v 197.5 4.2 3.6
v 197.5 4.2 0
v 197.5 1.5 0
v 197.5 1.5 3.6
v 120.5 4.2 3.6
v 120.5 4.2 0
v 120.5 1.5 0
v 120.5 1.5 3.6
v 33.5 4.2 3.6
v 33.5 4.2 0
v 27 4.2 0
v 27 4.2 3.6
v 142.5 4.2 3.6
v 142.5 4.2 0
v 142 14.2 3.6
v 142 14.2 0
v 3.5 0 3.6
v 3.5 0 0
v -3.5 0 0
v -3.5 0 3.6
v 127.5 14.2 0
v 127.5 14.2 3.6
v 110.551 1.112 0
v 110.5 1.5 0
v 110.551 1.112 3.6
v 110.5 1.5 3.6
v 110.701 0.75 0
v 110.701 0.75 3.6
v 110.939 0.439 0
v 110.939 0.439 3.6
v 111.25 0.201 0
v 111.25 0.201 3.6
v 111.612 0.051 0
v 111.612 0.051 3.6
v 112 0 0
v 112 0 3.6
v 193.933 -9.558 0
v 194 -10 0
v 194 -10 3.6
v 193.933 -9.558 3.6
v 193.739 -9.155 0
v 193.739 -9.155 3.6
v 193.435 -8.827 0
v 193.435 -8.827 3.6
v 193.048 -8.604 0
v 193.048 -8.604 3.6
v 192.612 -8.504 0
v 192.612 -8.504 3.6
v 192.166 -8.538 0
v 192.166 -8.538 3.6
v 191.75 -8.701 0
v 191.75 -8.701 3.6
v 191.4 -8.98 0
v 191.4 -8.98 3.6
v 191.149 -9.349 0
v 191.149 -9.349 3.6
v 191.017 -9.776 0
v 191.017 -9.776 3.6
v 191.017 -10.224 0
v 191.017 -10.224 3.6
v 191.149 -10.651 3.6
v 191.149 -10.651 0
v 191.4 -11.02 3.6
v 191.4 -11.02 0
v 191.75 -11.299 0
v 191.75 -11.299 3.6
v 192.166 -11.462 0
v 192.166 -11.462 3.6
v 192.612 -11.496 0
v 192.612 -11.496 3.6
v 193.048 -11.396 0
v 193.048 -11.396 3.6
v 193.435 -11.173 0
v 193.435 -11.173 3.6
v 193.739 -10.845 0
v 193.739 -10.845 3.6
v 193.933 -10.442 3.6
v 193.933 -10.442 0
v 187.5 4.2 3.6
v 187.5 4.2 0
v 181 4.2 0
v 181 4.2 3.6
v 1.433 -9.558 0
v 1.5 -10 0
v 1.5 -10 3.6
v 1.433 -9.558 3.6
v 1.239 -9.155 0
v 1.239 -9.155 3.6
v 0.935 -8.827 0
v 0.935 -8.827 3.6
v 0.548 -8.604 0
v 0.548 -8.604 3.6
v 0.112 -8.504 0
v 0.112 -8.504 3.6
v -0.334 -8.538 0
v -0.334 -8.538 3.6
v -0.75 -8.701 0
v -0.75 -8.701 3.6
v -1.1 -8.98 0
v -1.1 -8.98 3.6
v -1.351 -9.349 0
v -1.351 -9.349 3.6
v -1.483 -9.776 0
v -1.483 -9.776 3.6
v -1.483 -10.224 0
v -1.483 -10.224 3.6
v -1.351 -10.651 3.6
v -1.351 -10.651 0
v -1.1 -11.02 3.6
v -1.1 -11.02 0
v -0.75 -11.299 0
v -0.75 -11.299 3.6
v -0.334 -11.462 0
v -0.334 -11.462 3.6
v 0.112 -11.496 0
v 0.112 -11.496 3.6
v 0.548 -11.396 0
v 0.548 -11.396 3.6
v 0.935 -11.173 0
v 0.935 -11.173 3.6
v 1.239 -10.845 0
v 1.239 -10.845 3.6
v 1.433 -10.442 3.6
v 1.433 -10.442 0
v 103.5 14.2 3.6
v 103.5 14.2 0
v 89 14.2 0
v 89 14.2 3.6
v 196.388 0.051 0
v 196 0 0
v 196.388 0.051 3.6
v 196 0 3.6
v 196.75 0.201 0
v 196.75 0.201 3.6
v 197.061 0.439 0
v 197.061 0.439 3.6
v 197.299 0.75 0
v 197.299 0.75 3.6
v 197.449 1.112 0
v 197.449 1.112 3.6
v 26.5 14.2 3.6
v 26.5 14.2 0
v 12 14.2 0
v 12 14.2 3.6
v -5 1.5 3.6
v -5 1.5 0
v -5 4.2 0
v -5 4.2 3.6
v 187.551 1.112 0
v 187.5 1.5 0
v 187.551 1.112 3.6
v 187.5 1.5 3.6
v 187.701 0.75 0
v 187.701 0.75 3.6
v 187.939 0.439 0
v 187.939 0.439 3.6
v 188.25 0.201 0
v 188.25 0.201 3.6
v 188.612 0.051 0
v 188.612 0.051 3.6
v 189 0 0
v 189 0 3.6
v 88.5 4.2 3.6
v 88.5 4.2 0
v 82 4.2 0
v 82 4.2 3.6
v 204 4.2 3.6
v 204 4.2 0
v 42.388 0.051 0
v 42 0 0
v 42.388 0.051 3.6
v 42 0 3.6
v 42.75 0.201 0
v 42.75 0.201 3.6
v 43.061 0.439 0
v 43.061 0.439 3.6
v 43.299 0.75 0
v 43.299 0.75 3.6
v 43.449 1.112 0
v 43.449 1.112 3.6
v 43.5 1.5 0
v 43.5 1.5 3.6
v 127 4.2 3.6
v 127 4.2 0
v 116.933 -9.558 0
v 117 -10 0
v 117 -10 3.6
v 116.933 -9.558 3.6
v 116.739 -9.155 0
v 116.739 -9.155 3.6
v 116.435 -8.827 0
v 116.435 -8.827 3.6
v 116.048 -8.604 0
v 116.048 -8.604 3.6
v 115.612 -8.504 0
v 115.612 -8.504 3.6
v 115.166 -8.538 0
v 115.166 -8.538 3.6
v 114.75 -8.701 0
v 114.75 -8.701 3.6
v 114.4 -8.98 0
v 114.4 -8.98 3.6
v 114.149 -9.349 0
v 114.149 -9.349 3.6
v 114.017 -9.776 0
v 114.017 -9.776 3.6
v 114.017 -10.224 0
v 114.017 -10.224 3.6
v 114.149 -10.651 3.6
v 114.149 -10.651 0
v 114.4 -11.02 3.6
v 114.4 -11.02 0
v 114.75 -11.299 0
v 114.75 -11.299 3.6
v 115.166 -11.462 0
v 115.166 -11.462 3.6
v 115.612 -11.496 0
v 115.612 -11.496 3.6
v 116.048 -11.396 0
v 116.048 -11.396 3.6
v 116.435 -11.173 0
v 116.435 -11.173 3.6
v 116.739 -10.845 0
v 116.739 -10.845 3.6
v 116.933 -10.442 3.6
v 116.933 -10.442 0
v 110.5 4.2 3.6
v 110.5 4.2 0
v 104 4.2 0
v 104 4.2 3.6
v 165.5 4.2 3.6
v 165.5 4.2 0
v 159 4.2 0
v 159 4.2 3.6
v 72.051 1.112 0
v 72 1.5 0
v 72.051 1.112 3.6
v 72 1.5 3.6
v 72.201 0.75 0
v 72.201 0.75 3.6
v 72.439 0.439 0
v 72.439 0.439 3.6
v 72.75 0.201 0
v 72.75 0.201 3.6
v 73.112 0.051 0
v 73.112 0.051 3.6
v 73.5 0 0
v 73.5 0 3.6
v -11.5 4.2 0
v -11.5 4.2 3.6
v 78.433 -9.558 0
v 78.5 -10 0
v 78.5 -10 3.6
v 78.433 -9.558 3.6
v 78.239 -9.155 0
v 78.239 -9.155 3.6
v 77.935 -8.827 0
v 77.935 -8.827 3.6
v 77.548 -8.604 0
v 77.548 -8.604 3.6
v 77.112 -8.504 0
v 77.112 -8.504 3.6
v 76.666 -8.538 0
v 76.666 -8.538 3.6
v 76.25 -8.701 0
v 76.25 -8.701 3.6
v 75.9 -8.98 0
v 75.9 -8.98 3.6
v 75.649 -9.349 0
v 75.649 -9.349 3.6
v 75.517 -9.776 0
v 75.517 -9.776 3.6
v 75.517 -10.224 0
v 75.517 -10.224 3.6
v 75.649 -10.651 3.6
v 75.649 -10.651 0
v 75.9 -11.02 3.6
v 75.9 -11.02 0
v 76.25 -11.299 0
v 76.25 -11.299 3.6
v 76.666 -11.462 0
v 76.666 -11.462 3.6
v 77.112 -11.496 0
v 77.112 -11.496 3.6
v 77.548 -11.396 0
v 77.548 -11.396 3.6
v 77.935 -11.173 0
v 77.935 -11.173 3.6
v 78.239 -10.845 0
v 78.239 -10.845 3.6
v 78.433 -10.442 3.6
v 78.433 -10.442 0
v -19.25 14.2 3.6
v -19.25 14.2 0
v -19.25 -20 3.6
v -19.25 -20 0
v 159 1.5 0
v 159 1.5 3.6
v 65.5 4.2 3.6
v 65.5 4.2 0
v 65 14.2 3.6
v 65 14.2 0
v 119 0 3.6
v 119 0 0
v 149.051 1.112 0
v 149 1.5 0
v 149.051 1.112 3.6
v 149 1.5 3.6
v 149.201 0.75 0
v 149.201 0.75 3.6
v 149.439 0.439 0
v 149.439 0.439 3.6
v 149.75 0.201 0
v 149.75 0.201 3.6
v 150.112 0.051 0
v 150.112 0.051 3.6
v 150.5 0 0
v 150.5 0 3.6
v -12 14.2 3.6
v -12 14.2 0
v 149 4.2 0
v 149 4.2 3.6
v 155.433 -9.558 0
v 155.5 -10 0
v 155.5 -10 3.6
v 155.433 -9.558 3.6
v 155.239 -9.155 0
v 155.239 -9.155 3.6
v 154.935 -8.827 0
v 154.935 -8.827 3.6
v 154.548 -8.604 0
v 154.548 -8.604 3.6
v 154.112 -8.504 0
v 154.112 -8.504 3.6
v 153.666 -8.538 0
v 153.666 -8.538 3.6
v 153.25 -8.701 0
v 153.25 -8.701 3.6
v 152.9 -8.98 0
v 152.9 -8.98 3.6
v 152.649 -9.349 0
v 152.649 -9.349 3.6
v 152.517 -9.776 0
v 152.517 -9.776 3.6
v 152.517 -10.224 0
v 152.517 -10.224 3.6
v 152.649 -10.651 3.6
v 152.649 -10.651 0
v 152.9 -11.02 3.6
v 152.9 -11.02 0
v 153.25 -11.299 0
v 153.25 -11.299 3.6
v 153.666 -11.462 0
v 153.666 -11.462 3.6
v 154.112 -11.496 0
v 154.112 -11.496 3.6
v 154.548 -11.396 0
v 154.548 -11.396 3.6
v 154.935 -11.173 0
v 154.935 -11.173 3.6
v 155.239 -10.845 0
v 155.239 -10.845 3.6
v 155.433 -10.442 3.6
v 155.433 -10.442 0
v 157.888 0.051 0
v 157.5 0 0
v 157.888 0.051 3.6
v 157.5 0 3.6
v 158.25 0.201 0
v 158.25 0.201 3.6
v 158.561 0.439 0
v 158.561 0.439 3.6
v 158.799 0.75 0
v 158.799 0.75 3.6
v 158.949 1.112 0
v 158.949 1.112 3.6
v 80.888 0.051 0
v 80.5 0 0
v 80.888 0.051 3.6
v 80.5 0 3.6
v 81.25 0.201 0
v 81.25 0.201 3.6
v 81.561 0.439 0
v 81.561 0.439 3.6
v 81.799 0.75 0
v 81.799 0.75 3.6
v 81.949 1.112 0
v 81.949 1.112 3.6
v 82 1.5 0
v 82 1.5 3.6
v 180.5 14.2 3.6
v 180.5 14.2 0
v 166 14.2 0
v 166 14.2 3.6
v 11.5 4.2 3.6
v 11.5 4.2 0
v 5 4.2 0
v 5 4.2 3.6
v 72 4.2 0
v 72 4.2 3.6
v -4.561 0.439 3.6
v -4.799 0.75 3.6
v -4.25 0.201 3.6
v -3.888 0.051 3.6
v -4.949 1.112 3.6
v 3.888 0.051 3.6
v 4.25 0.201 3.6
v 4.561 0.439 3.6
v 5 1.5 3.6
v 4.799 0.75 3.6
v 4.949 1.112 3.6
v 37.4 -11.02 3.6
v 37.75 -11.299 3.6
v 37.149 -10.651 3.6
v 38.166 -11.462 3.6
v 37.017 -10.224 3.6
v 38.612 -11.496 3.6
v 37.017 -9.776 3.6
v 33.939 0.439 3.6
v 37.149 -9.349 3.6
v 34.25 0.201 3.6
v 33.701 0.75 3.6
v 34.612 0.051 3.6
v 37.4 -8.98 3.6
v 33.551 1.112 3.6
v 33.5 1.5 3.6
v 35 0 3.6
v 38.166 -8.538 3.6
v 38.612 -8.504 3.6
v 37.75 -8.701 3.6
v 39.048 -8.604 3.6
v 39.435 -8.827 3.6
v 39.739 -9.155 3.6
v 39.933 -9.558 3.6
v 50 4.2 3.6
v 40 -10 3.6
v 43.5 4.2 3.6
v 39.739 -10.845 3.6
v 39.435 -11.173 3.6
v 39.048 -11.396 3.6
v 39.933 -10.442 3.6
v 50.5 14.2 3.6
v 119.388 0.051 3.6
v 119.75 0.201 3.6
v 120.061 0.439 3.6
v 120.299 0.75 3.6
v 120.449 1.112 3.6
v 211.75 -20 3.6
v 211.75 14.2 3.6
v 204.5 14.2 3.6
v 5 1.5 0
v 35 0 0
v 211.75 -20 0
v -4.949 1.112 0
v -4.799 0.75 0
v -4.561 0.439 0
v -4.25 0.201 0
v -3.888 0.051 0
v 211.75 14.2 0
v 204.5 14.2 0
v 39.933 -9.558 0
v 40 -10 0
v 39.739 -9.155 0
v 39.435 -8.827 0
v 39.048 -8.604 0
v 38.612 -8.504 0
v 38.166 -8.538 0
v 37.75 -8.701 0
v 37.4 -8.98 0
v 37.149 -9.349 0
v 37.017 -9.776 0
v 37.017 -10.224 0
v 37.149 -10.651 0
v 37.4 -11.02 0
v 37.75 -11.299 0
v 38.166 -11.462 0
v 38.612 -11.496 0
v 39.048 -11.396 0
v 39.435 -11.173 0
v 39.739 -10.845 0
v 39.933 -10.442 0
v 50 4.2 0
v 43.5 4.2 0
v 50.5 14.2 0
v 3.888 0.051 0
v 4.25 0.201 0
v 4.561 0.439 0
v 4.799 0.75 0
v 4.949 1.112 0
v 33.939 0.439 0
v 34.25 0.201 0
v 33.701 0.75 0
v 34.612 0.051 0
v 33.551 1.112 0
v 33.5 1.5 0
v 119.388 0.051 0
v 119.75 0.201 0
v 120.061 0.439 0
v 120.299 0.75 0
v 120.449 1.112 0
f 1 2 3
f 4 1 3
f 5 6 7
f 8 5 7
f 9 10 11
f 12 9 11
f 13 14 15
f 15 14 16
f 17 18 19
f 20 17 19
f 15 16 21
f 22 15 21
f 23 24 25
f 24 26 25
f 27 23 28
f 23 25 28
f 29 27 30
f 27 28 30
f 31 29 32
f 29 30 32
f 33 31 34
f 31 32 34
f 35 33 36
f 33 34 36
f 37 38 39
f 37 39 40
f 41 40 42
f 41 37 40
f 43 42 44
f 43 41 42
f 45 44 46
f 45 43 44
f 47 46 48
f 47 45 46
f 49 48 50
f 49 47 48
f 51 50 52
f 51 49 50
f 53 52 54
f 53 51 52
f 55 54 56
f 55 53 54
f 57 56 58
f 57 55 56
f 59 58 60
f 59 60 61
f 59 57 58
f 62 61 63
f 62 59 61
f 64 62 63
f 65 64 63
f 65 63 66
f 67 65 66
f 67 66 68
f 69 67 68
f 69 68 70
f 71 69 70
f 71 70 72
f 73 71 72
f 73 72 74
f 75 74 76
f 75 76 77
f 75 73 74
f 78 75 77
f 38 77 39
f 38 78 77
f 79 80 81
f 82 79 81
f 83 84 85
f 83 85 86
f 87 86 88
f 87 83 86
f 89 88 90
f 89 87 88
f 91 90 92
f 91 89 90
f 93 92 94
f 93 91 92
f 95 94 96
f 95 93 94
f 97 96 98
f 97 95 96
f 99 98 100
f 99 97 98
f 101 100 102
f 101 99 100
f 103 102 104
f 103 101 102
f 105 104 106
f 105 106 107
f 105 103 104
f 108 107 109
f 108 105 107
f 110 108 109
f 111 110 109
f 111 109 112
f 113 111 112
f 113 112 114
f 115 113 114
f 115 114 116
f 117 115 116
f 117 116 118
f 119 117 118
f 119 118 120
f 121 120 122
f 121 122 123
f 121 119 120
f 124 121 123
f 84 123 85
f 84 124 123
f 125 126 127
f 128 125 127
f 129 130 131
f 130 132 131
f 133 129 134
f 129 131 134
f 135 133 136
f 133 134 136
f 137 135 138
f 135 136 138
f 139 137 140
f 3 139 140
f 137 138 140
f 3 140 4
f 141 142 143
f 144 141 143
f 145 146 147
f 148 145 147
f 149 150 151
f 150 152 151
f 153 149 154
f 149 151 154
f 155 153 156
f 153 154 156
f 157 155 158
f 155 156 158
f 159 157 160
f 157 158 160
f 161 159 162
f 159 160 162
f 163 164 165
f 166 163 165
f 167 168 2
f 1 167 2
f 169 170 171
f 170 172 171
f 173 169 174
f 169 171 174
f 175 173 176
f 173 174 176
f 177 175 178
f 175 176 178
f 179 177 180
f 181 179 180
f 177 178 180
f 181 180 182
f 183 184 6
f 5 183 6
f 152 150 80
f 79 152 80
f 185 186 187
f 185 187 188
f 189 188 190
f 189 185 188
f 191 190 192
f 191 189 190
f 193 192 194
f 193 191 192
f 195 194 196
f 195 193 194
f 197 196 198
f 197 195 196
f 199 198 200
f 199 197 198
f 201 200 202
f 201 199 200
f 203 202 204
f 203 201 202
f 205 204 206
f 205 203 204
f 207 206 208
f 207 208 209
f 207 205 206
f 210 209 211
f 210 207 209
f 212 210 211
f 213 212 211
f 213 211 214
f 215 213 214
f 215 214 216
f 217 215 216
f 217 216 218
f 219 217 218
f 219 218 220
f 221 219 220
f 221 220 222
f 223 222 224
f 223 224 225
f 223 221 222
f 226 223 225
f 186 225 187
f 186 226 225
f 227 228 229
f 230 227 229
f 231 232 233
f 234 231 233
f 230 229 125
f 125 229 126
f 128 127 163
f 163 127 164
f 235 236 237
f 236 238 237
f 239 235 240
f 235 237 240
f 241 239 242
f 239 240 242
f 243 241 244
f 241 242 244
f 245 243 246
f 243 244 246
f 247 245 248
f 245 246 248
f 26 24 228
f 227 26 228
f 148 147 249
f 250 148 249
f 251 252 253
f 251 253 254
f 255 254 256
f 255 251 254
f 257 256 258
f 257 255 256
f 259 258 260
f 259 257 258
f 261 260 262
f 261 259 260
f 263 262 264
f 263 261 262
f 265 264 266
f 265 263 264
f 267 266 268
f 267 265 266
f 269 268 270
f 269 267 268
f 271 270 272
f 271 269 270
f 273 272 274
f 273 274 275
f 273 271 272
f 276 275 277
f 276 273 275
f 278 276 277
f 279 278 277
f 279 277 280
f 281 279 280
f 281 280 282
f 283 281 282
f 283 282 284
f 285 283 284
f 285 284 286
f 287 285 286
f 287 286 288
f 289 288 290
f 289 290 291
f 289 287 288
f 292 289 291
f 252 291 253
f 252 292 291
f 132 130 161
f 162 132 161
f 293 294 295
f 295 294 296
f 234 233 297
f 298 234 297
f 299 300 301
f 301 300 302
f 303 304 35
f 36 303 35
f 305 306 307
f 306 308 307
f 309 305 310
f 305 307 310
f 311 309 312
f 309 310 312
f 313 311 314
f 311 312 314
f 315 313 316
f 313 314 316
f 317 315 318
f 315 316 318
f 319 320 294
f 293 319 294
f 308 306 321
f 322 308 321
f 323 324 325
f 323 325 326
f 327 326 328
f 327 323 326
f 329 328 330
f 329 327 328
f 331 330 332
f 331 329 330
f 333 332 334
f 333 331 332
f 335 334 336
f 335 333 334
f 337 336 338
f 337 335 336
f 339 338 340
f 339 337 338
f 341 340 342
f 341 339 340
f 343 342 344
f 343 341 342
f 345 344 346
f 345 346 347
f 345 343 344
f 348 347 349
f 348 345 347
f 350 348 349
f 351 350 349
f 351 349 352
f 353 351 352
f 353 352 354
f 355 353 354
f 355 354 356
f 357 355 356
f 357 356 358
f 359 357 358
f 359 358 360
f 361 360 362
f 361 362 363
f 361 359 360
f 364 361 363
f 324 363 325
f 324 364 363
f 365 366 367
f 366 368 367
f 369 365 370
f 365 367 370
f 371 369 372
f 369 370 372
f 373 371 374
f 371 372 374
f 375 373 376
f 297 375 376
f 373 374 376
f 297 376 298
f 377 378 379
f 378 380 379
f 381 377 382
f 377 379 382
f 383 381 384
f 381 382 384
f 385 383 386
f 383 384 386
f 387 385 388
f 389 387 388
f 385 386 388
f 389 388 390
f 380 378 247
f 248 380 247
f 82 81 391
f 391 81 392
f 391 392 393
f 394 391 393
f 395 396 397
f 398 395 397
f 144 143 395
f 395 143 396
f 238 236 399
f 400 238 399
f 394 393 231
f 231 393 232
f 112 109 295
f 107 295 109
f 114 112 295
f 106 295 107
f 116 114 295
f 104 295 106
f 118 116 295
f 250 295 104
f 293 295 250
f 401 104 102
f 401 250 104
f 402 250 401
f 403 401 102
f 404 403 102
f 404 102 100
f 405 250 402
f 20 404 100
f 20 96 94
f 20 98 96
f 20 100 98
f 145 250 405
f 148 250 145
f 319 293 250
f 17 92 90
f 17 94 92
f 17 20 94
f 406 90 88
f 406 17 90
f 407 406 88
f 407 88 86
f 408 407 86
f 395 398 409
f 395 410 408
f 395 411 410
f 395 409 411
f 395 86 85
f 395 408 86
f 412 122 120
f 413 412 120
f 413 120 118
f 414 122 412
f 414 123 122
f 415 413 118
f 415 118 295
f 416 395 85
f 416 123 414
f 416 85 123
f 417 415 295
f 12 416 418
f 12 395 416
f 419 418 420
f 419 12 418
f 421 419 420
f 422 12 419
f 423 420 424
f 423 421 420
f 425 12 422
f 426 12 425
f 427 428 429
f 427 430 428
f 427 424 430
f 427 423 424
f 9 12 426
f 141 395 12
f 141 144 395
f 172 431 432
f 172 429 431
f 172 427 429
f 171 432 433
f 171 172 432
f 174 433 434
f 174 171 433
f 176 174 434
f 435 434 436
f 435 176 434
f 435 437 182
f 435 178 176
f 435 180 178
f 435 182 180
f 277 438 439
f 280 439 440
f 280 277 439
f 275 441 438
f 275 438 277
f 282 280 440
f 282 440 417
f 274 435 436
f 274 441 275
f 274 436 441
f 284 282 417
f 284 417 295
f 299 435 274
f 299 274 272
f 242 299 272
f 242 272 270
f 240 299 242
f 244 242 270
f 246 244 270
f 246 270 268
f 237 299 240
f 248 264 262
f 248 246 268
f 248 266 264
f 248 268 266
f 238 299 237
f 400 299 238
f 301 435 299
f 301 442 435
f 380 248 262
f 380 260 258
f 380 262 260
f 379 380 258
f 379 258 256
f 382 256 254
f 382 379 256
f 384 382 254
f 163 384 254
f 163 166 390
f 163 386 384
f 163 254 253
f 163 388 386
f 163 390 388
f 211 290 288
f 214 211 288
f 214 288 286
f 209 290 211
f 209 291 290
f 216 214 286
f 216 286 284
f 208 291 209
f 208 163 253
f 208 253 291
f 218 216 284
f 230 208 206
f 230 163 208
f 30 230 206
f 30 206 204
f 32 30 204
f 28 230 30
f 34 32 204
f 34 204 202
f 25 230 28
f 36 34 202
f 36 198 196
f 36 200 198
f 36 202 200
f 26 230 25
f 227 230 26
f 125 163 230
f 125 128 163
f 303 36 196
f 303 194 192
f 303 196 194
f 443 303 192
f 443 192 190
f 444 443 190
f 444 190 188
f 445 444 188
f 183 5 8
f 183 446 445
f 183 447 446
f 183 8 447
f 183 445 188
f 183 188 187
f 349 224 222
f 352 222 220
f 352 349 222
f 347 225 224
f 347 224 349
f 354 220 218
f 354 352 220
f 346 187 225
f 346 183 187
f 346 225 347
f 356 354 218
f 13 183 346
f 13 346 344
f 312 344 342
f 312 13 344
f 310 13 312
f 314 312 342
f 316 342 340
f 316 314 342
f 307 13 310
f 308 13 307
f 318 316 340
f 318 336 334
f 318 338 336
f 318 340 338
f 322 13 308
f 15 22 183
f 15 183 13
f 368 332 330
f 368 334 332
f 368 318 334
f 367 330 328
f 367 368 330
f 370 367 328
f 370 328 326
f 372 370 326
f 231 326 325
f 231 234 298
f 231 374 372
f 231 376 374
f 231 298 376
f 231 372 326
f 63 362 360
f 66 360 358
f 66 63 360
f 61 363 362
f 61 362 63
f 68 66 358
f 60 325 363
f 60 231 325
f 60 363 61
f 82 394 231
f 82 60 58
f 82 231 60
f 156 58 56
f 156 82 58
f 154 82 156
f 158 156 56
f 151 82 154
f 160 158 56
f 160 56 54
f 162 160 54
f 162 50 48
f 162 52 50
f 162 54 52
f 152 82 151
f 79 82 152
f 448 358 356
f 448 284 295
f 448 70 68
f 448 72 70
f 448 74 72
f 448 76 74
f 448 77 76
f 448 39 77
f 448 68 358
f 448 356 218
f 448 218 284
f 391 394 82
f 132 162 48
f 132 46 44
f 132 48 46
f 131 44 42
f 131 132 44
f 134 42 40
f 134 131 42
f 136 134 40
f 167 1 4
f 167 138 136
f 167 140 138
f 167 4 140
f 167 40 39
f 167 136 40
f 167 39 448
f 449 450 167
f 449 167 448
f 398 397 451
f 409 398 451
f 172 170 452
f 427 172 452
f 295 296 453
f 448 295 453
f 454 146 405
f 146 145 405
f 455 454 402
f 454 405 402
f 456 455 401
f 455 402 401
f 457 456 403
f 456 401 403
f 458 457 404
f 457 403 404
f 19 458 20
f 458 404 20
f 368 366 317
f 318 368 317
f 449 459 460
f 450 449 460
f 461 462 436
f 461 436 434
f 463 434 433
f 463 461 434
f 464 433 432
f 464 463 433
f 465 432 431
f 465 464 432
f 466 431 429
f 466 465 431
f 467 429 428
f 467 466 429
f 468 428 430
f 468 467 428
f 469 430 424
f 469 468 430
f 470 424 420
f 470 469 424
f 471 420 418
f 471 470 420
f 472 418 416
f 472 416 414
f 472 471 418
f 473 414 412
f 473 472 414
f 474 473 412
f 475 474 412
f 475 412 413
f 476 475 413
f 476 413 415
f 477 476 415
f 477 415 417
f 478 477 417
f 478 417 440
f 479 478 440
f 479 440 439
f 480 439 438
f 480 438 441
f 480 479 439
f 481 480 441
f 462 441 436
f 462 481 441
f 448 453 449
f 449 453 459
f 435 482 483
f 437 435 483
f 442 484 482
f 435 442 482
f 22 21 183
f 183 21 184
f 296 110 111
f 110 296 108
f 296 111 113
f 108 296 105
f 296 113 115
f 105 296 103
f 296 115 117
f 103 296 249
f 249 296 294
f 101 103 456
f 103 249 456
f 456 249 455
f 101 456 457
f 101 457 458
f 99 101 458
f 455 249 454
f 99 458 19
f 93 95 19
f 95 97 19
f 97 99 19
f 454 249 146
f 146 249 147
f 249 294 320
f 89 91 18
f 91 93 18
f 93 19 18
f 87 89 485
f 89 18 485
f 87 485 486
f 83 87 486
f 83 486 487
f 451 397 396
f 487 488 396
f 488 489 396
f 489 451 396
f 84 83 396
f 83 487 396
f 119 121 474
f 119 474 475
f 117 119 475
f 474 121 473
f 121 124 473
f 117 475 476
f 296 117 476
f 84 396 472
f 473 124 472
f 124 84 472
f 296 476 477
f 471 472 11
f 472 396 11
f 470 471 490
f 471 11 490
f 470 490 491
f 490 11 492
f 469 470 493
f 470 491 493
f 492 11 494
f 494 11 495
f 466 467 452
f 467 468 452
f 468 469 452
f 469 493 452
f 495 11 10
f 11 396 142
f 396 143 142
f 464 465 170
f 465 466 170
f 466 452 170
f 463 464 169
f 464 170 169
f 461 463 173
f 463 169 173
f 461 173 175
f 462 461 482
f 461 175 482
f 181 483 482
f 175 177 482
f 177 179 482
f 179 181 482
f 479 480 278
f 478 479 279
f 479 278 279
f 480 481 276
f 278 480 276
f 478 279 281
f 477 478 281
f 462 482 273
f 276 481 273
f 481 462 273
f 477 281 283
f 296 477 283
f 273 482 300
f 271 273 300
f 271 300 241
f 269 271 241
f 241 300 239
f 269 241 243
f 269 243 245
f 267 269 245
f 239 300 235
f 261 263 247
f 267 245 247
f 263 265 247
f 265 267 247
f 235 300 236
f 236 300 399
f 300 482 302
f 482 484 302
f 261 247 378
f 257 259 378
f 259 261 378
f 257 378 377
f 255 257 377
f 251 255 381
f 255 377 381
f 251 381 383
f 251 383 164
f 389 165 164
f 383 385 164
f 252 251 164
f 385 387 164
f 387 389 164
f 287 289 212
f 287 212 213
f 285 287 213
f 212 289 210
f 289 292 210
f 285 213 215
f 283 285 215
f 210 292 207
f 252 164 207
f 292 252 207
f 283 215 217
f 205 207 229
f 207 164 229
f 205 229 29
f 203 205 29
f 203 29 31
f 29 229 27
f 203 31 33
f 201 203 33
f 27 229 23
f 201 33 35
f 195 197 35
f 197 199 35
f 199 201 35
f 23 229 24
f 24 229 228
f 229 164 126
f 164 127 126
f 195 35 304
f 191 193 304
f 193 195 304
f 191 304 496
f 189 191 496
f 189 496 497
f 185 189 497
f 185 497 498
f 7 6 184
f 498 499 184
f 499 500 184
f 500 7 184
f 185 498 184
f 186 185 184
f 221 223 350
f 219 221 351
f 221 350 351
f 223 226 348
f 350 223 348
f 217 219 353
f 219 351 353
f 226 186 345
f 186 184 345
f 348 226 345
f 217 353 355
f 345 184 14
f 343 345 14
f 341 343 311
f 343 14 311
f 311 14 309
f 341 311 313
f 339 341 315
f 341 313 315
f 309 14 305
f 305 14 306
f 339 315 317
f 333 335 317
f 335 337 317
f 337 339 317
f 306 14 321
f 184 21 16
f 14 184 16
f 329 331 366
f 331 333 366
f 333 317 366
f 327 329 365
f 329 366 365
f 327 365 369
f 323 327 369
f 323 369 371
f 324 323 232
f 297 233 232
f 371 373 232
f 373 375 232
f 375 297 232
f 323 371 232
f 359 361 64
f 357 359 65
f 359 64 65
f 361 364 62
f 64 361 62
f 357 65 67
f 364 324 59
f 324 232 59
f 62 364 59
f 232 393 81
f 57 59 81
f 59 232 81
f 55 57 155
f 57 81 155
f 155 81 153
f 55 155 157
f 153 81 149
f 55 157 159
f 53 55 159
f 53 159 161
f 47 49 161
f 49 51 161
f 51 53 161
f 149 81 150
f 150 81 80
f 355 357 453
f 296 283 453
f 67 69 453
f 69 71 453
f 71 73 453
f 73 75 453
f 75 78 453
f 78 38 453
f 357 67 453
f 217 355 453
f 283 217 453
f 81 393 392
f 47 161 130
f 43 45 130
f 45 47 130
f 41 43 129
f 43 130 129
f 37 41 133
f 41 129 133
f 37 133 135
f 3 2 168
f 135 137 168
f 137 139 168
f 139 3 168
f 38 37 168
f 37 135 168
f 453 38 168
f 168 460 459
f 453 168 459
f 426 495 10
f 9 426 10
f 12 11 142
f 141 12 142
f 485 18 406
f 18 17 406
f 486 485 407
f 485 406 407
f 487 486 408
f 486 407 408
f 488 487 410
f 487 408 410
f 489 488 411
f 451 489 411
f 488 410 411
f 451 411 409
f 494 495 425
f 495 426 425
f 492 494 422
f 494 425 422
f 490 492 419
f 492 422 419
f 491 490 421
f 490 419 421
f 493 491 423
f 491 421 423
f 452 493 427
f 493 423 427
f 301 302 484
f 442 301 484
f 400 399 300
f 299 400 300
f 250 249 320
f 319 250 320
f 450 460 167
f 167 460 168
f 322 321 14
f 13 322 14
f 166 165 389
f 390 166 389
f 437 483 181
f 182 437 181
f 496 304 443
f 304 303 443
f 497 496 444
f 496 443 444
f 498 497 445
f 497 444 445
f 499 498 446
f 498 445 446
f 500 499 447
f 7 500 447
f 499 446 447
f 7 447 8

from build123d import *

# Parameters (mm, degrees)
SKETCH1_R              = 1.5
BOSS_EXTRUDE1_DEPTH    = 3.6
FILLET1_R              = 1.5
LPATTERN2_COUNT        = 6
LPATTERN2_PITCH        = 38.5
FILLET1_OF_LPATTERN2_R = 1.5


with BuildPart() as part:
    # Sketch1 → Boss-Extrude1 (new body)
    with BuildSketch(Plane.XY):
        Polygon((-19.25, 14.2), (-19.25, 0), (-19.25, -20), (19.25, -20), (19.25, 0), (19.25, 14.2), (12, 14.2), (11.5, 4.2), (5, 4.2), (5, 0), (-5, 0), (-5, 4.2), (-11.5, 4.2), (-12, 14.2), align=None)
        with Locations((0, -10)):
            Circle(SKETCH1_R, mode=Mode.SUBTRACT)
    boss_extrude1 = extrude(amount=BOSS_EXTRUDE1_DEPTH)

    # Fillet1
    fillet1_edges = [part.edges().sort_by_distance(p)[0] for p in [
        (-5, 0, 1.8),
        (5, 0, 1.8),
    ]]
    fillet(fillet1_edges, radius=FILLET1_R)

    # LPattern2: Boss-Extrude1 ×6
    with Locations(*[(i * LPATTERN2_PITCH, 0, 0) for i in range(1, LPATTERN2_COUNT)]):
        add(boss_extrude1)

    # Fillet1 of LPattern2
    fillet1_of_lpattern2_edges = [part.edges().sort_by_distance(p)[0] for p in [
        (33.5, 0, 1.8),
        (43.5, 0, 1.8),
        (72, 0, 1.8),
        (82, 0, 1.8),
        (110.5, 0, 1.8),
        (120.5, 0, 1.8),
        (149, 0, 1.8),
        (159, 0, 1.8),
        (187.5, 0, 1.8),
        (197.5, 0, 1.8),
    ]]
    fillet(fillet1_of_lpattern2_edges, radius=FILLET1_OF_LPATTERN2_R)


solid = part.part
